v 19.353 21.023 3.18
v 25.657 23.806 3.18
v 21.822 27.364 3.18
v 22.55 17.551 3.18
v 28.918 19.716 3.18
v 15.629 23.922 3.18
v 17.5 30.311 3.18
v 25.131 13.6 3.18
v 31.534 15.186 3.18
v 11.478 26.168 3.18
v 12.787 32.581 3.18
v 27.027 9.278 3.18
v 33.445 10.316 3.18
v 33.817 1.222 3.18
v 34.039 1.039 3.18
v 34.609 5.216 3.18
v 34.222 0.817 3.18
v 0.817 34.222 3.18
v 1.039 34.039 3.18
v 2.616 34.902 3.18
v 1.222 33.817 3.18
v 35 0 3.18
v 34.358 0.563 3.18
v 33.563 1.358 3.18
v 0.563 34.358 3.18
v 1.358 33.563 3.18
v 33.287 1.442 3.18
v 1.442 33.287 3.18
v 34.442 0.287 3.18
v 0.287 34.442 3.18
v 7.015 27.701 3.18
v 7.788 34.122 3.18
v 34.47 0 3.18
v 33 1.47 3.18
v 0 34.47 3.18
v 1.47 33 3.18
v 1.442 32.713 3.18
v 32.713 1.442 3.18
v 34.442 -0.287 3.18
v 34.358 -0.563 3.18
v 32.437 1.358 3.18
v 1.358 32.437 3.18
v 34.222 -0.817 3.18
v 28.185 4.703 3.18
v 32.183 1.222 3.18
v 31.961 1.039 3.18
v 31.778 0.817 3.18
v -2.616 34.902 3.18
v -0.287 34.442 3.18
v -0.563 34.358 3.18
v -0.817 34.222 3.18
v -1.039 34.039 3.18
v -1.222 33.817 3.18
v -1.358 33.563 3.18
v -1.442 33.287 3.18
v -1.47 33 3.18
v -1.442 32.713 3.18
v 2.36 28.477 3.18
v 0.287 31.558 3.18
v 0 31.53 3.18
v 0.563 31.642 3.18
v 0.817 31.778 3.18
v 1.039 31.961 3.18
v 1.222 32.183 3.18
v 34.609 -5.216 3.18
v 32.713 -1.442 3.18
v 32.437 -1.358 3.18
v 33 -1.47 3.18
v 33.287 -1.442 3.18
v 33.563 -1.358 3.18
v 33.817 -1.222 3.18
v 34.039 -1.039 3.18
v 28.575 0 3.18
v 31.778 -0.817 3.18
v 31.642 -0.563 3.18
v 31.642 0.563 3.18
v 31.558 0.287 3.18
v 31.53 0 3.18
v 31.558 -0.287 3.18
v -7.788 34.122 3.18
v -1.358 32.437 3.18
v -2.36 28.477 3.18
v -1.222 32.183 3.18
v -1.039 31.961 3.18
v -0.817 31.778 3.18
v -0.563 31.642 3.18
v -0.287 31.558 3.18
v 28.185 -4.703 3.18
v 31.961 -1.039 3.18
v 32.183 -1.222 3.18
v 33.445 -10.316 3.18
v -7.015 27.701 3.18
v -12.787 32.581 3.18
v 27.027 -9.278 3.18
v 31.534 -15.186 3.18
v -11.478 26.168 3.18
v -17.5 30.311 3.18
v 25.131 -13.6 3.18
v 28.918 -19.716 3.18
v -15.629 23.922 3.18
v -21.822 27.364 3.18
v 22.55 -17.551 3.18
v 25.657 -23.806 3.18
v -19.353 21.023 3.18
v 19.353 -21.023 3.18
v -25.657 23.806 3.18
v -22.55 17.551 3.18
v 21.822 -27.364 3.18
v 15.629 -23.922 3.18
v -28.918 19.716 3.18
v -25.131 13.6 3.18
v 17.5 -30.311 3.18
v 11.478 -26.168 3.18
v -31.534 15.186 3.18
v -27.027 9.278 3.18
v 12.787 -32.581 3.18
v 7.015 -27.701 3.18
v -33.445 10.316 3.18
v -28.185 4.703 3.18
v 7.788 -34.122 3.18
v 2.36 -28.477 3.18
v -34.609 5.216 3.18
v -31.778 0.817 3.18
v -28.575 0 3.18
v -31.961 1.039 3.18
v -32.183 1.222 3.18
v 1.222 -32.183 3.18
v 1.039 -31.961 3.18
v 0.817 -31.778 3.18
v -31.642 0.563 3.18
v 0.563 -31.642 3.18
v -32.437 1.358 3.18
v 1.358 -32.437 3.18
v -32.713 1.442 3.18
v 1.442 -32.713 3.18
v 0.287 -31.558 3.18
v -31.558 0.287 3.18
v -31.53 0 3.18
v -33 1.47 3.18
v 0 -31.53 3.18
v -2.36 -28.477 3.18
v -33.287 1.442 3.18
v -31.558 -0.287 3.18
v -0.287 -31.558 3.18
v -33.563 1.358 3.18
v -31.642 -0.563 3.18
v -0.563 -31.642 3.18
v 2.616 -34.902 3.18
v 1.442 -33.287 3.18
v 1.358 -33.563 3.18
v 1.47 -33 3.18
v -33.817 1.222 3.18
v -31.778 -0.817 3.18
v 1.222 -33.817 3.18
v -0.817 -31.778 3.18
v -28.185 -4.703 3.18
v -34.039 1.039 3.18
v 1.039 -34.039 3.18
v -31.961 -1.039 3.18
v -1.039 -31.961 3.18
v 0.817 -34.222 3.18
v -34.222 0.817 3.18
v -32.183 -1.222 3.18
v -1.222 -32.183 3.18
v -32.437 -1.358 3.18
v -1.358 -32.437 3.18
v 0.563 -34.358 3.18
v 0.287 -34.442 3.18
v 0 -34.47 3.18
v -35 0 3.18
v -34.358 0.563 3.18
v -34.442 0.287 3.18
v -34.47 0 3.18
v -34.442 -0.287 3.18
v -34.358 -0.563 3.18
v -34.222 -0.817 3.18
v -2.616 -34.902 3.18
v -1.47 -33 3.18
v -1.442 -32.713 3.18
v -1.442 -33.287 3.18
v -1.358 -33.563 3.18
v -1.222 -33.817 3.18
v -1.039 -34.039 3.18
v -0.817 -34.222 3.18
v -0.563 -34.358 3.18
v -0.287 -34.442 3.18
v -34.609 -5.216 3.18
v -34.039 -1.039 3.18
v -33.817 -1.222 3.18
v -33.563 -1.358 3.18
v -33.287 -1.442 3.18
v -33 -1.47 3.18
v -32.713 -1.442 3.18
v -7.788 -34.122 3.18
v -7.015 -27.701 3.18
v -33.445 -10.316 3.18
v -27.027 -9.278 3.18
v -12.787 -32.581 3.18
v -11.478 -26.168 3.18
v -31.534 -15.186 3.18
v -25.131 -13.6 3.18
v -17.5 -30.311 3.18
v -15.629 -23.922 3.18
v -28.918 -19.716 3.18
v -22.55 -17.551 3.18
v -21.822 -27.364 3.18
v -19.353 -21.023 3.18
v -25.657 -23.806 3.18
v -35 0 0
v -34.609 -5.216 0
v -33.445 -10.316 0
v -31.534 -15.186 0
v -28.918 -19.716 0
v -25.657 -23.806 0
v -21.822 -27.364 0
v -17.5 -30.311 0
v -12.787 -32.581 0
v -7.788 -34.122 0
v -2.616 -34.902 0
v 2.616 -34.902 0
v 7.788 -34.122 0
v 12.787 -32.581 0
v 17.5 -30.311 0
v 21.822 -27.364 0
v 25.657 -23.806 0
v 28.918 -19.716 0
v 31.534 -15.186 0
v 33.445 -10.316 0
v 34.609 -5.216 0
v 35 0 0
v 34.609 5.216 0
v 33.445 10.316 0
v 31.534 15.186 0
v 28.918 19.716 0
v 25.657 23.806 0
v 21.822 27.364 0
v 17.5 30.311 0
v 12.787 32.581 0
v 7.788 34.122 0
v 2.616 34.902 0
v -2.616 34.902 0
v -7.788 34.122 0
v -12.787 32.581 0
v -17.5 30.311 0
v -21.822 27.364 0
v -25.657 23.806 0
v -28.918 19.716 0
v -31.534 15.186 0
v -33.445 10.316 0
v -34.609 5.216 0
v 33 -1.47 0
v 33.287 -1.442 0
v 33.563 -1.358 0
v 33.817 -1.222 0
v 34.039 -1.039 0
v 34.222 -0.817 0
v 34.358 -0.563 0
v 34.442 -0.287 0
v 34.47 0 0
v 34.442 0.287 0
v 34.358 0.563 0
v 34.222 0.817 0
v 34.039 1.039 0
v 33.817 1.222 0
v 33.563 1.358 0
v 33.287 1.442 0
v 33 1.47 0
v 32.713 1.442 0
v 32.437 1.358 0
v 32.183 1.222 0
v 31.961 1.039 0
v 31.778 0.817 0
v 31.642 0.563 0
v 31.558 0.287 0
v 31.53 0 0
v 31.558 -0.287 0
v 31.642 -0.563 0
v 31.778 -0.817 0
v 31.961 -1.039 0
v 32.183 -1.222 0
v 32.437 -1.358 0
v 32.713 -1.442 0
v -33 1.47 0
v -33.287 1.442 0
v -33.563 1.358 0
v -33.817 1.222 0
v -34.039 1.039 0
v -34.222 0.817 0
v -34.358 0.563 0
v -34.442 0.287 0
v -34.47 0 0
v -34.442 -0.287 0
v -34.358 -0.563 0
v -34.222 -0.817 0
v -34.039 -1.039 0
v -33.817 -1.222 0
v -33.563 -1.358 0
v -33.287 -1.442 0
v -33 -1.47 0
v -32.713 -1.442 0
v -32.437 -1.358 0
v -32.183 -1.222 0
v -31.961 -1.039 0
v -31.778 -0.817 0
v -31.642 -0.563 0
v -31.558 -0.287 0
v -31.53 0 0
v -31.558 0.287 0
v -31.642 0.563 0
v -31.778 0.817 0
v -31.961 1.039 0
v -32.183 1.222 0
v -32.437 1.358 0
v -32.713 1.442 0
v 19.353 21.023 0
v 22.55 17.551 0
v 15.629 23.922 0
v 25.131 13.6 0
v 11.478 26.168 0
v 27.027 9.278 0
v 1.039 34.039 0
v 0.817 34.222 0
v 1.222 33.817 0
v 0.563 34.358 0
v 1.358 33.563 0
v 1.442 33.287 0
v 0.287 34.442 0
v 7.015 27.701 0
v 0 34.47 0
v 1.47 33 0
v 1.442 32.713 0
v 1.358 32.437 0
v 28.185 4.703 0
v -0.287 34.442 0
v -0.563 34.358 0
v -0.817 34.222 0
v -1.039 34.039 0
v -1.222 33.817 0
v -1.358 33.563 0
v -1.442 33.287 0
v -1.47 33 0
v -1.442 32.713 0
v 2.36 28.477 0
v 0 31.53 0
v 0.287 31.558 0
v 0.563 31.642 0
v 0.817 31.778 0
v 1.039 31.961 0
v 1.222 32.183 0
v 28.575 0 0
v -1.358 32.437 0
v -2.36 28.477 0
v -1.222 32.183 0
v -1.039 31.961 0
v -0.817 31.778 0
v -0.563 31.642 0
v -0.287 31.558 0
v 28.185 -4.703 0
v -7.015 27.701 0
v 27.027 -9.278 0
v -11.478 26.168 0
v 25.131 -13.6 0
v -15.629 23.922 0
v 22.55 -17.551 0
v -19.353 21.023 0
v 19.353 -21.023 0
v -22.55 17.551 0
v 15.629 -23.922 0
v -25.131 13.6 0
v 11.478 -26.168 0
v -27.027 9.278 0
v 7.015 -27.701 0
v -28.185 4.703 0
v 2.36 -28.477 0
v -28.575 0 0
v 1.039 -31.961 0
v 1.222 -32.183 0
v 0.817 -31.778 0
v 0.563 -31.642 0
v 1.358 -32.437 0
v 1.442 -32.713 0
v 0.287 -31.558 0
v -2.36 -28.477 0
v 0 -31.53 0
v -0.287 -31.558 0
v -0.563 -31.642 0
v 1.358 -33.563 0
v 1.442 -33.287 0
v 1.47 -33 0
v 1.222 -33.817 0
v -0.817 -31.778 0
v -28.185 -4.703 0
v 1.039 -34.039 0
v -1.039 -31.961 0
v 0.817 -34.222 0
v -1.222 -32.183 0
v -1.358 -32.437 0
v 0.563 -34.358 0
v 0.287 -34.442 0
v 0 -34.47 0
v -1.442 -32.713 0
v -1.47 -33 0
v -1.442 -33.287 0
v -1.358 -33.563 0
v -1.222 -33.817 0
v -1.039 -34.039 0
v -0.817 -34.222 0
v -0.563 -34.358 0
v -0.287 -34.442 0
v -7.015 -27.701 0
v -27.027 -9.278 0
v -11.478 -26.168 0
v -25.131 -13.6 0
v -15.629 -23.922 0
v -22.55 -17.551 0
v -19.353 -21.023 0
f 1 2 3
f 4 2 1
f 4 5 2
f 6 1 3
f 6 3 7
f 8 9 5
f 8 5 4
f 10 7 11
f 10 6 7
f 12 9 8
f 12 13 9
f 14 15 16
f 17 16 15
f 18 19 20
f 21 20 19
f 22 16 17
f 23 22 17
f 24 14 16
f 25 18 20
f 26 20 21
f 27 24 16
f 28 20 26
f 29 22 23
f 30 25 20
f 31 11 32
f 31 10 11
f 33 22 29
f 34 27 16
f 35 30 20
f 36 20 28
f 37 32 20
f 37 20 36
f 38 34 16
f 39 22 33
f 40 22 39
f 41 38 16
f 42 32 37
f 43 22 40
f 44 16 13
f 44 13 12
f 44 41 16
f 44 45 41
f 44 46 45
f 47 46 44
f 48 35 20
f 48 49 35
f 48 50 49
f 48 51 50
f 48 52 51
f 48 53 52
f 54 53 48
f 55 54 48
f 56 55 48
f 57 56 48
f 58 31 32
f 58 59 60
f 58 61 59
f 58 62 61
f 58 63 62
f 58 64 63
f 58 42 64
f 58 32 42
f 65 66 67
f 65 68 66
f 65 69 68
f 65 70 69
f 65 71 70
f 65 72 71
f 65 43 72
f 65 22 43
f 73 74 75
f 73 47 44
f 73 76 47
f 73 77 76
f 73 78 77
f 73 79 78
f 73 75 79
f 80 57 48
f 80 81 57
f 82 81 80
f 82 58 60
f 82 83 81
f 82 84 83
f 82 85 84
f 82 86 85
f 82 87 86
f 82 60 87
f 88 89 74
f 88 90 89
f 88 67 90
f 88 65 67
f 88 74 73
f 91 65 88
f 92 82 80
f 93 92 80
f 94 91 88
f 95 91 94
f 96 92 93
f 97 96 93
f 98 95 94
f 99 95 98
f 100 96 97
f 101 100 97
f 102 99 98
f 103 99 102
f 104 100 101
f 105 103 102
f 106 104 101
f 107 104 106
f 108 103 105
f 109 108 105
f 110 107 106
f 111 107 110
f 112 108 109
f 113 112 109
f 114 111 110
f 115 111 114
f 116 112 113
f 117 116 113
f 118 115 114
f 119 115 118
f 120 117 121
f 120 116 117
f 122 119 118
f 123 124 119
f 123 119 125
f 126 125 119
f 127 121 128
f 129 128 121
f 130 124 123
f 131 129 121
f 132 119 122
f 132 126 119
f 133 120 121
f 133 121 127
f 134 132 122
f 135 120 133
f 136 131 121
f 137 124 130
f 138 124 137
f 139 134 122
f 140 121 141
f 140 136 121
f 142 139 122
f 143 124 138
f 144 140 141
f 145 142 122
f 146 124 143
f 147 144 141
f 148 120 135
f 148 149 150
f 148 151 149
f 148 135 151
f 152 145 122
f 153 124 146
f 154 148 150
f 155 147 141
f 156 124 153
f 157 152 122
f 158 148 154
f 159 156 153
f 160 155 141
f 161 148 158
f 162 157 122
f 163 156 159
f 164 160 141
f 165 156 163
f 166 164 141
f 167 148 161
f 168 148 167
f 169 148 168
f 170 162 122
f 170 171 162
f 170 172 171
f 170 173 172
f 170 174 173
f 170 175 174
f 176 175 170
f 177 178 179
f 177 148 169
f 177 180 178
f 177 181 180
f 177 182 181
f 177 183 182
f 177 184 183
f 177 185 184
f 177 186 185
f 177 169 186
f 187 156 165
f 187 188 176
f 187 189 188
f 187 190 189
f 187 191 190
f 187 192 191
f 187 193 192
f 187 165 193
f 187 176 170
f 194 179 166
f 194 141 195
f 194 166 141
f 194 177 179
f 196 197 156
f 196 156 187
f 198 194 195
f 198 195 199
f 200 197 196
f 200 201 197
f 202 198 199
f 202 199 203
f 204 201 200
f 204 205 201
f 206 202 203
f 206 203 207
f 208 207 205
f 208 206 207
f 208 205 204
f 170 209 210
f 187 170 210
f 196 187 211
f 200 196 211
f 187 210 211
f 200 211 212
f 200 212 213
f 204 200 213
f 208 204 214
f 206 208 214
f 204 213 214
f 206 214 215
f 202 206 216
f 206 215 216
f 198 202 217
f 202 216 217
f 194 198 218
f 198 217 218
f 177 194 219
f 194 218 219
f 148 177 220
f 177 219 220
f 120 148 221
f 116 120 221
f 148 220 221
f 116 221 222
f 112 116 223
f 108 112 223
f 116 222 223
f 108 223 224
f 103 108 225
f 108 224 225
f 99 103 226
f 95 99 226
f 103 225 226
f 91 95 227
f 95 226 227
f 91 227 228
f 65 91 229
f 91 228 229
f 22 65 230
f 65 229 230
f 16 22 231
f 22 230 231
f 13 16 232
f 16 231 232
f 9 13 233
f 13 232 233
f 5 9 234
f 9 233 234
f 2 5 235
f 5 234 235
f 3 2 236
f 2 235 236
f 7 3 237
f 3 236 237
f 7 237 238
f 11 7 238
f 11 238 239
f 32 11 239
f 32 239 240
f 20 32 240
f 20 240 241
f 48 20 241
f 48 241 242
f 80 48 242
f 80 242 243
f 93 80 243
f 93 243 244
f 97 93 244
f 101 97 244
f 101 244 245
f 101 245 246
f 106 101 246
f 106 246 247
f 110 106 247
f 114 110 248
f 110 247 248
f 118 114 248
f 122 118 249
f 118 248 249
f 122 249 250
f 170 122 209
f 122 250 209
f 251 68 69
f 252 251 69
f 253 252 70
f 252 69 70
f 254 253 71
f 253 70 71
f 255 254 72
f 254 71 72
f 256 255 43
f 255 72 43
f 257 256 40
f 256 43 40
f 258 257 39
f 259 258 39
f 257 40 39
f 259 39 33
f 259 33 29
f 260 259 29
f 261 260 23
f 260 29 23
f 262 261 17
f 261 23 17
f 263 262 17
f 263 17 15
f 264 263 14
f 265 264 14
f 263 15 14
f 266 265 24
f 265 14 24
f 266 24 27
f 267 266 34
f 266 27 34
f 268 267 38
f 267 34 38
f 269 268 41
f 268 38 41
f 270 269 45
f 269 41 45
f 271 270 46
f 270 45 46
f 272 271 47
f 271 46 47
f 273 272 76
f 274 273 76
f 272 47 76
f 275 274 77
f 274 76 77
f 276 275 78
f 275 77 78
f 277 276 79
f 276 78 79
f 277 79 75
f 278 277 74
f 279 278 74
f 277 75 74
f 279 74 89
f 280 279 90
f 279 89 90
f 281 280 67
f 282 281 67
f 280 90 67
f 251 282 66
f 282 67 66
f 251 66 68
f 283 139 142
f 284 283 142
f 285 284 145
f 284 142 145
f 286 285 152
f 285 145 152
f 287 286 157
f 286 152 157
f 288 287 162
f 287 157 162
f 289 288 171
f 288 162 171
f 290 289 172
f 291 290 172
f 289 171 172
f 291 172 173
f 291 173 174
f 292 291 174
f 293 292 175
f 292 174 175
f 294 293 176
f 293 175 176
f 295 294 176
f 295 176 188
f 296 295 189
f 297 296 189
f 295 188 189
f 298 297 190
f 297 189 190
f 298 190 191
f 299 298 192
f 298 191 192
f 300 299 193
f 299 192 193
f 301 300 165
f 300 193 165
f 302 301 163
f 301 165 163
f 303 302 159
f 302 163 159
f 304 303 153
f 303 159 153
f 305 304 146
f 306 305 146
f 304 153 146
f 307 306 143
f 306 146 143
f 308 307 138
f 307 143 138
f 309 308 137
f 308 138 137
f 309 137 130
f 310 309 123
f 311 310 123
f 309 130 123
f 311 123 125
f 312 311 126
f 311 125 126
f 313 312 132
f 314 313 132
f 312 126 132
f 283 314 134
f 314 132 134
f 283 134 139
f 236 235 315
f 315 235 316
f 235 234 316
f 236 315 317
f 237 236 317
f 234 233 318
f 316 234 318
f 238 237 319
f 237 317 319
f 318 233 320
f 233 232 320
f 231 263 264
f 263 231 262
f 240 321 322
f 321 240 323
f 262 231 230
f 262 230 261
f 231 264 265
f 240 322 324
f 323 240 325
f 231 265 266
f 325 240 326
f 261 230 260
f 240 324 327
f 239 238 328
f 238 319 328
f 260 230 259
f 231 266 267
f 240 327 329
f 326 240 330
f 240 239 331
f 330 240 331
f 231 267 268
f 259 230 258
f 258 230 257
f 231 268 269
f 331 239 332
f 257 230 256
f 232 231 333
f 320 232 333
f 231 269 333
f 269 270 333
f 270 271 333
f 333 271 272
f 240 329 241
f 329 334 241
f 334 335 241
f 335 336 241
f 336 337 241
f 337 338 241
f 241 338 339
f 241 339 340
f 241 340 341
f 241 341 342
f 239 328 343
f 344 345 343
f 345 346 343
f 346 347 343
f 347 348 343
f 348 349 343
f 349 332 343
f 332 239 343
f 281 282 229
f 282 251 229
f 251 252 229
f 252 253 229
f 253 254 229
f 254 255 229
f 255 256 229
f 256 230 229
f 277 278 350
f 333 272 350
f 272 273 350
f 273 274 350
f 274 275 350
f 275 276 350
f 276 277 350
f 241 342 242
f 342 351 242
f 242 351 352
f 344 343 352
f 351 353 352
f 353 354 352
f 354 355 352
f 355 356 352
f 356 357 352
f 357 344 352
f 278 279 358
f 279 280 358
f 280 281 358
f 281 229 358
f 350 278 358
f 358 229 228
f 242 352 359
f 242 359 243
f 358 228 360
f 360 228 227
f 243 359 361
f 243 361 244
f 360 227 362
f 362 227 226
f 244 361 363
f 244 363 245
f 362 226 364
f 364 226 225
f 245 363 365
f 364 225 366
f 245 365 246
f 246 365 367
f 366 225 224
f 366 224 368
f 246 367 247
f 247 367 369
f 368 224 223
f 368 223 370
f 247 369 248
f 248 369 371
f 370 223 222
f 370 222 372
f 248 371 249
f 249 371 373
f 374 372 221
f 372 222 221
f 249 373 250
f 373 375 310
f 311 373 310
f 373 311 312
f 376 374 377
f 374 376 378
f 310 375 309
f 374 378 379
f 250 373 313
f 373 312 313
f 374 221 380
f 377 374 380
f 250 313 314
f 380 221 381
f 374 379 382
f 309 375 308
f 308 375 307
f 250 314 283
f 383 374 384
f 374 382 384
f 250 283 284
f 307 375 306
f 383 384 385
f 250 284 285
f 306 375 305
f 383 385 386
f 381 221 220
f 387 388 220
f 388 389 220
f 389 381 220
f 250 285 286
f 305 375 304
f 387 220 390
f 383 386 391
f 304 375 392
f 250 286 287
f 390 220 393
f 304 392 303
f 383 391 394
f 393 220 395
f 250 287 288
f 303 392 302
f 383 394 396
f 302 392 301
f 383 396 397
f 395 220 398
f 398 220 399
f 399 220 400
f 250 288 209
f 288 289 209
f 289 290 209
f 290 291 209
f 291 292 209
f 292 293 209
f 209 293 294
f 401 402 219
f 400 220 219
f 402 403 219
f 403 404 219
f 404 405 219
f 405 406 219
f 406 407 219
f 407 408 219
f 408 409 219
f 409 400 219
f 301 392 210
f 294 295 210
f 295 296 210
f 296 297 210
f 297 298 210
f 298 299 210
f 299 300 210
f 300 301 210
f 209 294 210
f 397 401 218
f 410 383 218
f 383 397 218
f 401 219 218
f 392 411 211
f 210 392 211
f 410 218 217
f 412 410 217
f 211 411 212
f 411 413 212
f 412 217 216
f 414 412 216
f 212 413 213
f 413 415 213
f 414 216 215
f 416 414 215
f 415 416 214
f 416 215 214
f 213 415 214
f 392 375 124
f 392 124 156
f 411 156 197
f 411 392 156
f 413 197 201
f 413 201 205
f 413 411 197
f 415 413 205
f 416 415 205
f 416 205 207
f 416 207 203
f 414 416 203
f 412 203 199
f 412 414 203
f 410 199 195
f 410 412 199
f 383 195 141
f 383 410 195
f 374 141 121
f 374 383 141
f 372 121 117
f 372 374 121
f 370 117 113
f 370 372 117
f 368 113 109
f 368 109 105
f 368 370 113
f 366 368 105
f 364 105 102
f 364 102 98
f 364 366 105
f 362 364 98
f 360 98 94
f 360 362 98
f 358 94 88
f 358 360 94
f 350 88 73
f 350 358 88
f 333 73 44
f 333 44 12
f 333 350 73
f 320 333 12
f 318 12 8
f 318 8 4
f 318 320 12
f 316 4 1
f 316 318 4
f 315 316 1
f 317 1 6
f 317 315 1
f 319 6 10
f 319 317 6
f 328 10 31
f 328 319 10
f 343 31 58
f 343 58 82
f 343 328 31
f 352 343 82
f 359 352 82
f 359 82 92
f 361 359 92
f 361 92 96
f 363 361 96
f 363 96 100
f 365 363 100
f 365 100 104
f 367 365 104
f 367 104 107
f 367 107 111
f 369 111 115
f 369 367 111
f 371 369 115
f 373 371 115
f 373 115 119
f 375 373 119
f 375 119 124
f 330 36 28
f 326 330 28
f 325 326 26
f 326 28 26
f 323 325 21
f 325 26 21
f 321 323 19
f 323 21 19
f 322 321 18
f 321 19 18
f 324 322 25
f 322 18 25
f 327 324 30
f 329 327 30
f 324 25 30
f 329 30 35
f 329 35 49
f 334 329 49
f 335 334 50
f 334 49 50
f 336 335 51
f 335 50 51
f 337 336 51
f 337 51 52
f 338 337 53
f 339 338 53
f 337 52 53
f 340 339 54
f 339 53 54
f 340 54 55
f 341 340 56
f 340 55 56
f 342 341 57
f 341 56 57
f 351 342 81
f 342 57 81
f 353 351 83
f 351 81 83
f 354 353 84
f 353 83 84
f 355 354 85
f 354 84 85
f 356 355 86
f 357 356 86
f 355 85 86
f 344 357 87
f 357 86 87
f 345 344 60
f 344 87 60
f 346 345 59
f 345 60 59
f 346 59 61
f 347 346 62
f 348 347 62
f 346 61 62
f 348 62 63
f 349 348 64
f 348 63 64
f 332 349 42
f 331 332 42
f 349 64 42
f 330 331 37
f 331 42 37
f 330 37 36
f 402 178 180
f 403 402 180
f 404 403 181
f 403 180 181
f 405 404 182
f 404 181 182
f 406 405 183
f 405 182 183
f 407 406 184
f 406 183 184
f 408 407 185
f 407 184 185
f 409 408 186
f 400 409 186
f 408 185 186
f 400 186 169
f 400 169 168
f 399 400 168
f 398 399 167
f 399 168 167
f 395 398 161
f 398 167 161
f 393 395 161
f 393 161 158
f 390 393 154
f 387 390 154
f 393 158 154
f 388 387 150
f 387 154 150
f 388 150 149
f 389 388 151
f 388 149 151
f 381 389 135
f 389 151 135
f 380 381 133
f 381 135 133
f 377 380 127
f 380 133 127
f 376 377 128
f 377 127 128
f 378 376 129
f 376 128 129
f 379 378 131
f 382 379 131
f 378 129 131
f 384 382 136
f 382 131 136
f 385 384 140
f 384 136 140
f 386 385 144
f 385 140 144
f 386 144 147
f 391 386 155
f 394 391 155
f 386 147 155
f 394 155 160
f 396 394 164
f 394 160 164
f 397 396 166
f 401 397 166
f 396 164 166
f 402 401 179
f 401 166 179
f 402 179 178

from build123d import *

# Parameters (mm, degrees)
SKETCH1_R           = 35
SKETCH1_R_2         = 28.575
BOSS_EXTRUDE1_DEPTH = 3.18
SKETCH2_R           = 1.47
CUT_EXTRUDE1_DEPTH  = 3.18
CIRPATTERN1_COUNT   = 4


with BuildPart() as part:
    # Sketch1 → Boss-Extrude1 (new body)
    with BuildSketch(Plane.XY):
        with Locations(Location((0, 0, 0), (0, 0, 180))):
            Circle(SKETCH1_R)
        with Locations(Location((0, 0, 0), (0, 0, 180))):
            Circle(SKETCH1_R_2, mode=Mode.SUBTRACT)
    extrude(amount=BOSS_EXTRUDE1_DEPTH)

    # Sketch2 → Cut-Extrude1 (cut)
    with BuildSketch(Plane.XY.offset(3.18)):
        with Locations((0, 33)):
            Circle(SKETCH2_R)
    cut_extrude1 = extrude(amount=-CUT_EXTRUDE1_DEPTH, mode=Mode.SUBTRACT)

    # CirPattern1: Cut-Extrude1 ×4 about axis
    cirpattern1_axis = Axis((0, 0, 0), (0, 0, 1))
    for i in range(1, CIRPATTERN1_COUNT):
        add(cut_extrude1.rotate(cirpattern1_axis, i * 360 / CIRPATTERN1_COUNT), mode=Mode.SUBTRACT)


solid = part.part
